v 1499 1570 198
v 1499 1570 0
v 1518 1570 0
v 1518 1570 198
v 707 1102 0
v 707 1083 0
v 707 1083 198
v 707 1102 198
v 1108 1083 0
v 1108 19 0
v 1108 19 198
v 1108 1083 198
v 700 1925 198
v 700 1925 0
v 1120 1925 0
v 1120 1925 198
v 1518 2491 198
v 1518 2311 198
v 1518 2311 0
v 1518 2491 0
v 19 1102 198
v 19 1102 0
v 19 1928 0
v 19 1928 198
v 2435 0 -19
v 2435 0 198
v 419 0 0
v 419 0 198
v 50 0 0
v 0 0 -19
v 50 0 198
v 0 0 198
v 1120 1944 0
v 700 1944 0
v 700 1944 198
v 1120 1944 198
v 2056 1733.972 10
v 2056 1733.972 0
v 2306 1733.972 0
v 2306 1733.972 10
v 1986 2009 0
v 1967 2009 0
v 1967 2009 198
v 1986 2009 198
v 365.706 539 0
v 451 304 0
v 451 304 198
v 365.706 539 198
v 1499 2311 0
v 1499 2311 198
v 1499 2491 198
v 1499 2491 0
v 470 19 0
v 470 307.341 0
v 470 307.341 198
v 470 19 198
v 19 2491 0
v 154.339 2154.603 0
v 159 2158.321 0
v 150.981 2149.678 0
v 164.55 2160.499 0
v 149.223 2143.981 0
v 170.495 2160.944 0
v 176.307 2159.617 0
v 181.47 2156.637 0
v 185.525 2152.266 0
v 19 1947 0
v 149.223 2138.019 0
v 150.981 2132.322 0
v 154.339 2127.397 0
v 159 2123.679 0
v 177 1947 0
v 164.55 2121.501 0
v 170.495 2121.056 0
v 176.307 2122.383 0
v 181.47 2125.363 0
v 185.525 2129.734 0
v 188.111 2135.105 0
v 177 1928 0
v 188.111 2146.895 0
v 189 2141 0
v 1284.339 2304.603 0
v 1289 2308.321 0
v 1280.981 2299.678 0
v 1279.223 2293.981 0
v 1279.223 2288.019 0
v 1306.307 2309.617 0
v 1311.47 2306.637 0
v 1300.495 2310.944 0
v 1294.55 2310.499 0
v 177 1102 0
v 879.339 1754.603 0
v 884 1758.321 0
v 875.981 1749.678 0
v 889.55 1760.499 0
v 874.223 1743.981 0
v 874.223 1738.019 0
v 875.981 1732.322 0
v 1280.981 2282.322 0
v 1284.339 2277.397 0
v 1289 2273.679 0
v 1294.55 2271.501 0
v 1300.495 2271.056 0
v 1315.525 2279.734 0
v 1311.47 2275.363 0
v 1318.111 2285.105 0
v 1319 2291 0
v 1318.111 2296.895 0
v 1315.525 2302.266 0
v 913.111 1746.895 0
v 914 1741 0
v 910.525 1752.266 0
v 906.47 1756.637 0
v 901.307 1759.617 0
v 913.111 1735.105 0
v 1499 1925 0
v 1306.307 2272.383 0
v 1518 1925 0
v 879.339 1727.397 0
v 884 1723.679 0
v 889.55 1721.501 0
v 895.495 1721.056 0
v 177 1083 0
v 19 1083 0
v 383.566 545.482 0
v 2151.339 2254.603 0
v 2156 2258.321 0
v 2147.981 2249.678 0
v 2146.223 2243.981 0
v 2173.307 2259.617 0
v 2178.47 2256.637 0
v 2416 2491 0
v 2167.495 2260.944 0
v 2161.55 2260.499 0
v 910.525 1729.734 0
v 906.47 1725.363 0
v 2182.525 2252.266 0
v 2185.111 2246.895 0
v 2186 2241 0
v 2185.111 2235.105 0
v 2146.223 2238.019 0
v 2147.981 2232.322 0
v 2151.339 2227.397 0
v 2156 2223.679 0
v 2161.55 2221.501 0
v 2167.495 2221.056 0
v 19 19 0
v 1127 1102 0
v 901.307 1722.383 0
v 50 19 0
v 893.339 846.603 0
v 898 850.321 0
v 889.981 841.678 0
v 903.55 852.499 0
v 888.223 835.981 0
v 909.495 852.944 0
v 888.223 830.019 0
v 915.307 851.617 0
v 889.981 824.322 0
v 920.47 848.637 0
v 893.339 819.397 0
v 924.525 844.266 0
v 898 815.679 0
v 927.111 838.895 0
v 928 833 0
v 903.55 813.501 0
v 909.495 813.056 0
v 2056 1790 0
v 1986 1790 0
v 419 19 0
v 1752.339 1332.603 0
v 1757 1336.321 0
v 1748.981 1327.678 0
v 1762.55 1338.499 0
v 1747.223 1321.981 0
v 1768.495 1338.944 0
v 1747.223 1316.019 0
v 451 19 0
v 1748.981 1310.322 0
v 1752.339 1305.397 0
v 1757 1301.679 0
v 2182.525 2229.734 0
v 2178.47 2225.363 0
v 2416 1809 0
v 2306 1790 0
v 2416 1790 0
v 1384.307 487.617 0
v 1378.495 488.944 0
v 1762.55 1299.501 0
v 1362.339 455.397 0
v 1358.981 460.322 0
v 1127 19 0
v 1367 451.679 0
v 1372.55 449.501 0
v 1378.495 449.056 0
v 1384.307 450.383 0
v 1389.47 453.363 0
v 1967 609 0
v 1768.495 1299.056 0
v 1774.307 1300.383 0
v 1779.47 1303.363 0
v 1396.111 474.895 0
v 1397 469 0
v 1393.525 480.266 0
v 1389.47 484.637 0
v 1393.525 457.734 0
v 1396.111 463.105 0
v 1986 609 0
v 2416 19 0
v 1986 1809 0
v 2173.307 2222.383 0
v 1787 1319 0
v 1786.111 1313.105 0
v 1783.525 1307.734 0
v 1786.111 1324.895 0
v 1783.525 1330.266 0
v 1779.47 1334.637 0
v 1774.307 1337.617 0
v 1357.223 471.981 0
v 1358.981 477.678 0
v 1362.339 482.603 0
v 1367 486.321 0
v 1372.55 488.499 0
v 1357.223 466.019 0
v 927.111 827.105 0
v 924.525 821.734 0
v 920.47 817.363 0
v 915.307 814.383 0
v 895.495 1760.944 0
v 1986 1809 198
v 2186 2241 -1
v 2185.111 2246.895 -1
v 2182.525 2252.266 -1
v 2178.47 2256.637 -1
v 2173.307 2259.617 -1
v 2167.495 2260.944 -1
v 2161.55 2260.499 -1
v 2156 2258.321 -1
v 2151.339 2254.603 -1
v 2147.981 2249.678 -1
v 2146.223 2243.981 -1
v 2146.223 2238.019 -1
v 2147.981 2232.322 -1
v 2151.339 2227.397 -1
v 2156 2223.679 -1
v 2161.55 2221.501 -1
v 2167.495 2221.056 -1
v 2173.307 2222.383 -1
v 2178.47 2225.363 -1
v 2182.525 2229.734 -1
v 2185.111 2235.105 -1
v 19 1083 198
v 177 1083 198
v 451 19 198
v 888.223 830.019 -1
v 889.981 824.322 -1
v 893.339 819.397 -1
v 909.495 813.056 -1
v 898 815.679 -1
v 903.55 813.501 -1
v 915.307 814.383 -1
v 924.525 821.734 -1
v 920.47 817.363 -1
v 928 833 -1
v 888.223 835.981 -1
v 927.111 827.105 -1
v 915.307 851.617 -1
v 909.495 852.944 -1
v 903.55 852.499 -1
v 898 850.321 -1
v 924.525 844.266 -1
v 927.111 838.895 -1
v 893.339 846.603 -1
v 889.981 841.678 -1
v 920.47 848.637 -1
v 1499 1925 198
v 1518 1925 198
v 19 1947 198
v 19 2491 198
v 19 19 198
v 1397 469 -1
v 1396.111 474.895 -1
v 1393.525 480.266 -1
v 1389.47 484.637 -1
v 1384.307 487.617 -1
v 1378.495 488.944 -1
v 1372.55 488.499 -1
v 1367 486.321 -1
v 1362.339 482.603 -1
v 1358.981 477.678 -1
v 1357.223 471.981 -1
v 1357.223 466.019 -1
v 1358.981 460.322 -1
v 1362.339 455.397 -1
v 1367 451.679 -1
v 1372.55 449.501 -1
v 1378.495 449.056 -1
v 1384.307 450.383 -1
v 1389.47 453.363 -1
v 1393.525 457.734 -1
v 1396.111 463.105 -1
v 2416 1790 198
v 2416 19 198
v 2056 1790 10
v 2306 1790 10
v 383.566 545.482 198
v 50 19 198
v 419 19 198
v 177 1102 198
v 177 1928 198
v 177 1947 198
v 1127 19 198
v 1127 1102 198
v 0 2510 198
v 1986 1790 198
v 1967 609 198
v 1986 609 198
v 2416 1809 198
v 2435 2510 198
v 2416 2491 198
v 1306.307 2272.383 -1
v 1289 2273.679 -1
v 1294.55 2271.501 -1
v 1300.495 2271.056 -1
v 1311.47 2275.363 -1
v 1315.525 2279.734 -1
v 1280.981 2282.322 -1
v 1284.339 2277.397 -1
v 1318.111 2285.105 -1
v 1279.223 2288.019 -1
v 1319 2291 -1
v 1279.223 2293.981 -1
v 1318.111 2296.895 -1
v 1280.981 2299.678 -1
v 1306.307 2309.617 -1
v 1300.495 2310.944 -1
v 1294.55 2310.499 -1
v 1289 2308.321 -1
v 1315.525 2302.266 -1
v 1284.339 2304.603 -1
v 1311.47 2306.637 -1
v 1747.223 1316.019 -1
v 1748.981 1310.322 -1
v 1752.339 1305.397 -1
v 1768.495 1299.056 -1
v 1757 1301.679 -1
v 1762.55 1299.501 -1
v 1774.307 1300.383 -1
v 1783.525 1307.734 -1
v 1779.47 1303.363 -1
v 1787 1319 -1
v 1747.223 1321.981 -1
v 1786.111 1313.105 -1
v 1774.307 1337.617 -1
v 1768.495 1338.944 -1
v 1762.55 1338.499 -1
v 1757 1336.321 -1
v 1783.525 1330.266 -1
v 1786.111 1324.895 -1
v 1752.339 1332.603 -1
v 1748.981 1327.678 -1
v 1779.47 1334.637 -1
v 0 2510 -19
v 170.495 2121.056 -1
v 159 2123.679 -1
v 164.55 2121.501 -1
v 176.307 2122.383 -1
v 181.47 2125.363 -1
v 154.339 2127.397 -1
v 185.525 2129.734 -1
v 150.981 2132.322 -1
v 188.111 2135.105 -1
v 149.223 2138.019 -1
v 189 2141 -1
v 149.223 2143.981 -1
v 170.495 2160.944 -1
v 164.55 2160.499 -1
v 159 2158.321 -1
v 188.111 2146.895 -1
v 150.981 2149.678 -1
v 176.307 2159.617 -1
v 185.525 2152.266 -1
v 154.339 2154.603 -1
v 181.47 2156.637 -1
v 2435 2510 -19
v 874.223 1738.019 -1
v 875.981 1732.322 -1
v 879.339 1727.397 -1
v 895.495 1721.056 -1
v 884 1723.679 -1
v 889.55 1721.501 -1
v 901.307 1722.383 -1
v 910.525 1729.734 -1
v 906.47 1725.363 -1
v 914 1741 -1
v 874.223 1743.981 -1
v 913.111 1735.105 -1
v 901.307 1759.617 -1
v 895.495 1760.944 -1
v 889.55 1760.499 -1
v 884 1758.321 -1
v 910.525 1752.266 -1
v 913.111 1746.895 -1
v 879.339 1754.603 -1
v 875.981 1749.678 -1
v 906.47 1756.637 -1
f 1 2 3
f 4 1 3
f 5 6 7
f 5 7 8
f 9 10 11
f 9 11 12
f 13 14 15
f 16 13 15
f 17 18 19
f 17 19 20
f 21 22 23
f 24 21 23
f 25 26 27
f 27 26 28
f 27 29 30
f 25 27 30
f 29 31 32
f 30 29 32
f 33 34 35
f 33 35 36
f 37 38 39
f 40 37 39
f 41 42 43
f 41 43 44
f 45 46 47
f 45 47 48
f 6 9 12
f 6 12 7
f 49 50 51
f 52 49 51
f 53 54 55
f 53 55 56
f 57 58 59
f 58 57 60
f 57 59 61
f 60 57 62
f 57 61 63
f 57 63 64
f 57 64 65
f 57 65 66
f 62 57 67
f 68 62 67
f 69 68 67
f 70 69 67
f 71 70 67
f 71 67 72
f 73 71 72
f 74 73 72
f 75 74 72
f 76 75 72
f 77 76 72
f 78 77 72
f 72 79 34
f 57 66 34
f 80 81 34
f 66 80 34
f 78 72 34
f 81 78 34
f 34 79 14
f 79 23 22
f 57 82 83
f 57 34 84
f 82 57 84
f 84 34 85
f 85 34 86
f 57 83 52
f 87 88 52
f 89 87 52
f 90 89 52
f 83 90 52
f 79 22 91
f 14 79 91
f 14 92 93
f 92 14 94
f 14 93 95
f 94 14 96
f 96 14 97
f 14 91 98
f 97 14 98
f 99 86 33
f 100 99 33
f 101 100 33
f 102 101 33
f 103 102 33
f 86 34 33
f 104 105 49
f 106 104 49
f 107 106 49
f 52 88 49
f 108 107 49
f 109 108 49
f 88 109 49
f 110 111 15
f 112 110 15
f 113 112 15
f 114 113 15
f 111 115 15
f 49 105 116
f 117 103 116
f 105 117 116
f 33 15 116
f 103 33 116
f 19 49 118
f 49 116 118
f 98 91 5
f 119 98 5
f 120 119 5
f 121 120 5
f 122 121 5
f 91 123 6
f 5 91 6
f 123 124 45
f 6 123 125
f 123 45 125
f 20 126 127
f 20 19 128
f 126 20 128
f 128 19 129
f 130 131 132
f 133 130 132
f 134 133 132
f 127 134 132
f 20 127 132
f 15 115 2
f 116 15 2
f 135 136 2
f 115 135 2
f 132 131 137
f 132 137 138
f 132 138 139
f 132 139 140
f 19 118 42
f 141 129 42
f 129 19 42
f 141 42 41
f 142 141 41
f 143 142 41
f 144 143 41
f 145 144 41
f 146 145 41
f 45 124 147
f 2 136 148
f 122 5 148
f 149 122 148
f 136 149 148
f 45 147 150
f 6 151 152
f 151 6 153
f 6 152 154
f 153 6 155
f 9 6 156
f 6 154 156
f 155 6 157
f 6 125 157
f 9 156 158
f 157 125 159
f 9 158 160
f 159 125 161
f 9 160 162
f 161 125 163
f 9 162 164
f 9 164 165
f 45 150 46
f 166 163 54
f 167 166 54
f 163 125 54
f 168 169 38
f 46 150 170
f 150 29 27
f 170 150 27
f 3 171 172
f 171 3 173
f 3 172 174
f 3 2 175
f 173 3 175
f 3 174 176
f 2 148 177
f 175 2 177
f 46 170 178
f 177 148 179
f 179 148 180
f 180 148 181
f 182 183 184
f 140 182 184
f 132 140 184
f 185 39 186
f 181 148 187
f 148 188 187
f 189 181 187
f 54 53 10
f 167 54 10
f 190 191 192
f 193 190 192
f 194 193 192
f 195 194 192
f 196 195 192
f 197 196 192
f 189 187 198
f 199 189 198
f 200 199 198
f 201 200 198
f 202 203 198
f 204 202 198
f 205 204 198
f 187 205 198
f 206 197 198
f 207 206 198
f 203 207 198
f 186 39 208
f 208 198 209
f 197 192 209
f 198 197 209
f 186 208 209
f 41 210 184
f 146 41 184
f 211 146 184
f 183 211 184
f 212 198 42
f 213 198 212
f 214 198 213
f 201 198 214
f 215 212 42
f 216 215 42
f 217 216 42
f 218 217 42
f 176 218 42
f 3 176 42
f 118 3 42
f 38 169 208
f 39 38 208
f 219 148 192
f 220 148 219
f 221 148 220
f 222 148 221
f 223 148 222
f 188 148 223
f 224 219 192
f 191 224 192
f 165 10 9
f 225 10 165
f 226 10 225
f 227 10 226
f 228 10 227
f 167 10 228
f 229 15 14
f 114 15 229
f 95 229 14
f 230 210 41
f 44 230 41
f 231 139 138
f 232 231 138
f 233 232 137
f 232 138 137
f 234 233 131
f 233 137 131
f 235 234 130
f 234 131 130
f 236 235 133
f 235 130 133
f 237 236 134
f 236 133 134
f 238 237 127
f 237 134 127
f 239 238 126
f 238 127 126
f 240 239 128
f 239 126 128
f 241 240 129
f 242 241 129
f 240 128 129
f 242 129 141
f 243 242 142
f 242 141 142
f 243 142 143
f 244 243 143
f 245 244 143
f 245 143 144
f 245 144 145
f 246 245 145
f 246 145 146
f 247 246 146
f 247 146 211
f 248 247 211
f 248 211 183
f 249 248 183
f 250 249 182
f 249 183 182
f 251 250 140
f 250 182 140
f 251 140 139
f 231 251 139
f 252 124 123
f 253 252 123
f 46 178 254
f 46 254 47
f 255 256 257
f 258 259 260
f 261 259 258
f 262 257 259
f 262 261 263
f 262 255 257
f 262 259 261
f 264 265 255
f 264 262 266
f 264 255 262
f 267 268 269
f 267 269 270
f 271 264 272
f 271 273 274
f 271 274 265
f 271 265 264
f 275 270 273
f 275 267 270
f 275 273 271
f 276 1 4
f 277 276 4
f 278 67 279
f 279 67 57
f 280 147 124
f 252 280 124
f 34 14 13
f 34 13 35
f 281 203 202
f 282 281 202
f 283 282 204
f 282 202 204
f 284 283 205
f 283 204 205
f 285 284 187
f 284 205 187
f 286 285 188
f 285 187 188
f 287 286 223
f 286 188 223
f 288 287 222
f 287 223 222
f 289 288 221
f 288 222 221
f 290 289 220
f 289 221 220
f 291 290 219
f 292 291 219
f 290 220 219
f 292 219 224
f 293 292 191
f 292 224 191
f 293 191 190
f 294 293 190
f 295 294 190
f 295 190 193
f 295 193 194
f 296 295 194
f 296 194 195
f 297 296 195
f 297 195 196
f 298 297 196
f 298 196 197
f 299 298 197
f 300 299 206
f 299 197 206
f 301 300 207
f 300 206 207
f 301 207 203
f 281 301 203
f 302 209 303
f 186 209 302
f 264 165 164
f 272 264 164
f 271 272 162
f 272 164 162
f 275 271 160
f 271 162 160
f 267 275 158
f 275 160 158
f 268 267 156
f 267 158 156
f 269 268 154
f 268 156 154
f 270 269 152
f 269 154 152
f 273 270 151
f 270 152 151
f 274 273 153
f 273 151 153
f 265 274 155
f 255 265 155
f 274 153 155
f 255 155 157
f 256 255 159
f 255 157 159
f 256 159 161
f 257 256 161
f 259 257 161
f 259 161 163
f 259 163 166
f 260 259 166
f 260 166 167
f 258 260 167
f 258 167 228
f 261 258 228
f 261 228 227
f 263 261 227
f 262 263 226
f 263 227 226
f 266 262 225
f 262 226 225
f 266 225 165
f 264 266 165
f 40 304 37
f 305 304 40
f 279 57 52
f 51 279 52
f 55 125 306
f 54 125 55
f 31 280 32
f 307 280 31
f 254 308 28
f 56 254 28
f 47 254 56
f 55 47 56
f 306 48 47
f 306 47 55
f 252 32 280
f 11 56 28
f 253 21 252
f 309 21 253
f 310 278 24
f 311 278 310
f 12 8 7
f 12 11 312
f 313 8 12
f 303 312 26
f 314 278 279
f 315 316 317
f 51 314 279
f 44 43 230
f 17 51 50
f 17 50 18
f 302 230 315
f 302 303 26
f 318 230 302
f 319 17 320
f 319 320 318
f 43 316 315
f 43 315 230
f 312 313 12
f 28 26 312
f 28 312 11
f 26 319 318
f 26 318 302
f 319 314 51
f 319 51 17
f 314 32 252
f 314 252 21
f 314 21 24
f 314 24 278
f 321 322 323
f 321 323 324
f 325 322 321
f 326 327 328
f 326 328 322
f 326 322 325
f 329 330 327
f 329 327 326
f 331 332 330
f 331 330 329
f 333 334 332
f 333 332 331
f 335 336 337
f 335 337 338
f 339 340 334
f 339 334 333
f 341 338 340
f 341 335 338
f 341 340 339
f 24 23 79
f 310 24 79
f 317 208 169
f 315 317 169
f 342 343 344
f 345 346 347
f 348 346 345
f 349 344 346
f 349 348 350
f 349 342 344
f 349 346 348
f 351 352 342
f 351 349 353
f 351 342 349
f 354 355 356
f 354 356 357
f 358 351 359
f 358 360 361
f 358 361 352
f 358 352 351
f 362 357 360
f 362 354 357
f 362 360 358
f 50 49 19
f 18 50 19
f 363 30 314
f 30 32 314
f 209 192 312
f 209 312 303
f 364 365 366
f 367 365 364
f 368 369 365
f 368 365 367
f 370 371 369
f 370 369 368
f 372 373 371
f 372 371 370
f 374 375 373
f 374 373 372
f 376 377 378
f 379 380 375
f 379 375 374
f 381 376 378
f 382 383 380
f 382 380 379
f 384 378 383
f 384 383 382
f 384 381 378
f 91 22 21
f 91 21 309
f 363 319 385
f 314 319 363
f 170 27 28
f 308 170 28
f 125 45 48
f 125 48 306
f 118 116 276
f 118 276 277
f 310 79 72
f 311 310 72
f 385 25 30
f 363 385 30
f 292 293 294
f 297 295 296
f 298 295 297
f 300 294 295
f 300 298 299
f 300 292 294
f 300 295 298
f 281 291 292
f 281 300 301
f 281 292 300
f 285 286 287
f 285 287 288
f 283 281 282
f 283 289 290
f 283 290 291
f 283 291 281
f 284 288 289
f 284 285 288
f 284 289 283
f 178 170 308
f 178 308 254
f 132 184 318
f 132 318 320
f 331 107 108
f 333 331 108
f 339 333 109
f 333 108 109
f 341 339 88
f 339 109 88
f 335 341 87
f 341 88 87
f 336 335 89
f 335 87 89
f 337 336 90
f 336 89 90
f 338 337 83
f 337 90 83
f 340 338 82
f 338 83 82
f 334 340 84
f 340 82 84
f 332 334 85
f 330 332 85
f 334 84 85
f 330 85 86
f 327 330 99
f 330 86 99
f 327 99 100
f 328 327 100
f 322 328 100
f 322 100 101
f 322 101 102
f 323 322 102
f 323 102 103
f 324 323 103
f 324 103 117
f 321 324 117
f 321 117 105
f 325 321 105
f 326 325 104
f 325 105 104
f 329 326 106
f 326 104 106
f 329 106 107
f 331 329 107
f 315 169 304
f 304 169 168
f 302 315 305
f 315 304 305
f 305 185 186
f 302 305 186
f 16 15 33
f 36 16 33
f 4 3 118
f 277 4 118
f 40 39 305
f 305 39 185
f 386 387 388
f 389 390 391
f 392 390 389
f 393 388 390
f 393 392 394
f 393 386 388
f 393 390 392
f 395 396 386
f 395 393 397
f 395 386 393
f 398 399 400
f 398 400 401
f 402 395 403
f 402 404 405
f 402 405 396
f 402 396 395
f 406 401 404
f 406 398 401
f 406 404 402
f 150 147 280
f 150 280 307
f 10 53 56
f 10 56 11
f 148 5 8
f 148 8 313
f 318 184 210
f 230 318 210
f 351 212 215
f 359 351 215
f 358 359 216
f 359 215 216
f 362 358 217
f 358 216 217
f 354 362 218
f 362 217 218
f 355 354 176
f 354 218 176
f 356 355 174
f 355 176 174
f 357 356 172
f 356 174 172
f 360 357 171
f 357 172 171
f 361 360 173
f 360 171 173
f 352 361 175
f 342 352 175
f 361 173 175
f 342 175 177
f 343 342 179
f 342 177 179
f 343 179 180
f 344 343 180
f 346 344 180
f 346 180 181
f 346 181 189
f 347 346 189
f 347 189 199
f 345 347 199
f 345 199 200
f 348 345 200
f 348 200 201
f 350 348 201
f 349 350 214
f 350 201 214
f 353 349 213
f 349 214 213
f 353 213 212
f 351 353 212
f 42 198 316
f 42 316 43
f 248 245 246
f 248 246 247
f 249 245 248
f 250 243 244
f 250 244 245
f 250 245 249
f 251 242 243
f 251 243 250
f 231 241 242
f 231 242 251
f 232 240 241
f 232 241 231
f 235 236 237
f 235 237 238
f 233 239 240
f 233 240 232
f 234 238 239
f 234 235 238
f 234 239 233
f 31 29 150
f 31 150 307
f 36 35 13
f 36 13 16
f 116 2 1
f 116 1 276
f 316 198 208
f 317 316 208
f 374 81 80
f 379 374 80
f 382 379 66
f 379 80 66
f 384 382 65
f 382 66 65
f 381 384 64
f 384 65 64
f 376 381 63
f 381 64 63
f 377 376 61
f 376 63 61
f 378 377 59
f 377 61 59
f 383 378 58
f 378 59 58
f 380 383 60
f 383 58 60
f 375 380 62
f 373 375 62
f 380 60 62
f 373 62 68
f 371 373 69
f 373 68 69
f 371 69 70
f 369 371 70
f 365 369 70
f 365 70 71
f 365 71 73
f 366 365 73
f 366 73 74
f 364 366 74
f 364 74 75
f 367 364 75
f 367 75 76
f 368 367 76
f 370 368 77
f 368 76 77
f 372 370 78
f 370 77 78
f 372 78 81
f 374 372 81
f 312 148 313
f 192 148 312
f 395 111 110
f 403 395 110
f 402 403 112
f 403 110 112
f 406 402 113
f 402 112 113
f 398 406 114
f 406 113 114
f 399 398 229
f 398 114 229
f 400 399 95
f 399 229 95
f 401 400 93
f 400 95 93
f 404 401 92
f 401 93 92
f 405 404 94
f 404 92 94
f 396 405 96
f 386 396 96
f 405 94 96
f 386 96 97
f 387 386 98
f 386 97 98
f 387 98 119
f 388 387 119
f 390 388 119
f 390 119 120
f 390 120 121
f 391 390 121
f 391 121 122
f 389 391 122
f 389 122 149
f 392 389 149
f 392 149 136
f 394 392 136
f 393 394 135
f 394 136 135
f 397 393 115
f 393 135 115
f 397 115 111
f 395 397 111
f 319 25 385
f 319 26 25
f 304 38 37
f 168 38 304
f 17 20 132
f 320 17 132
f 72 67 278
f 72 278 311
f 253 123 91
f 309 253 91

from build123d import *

# Parameters (mm, degrees)
ESQUISSE1_W             = 2435
ESQUISSE1_H             = 2510
ESQUISSE1_W_2           = 2397
ESQUISSE1_H_2           = 2472
EXTRU_MINCE1_DEPTH      = 198
ESQUISSE2_W             = 2435
ESQUISSE2_H             = 2510
BOSS_EXTRU_1_DEPTH      = 19
EXTRU_MINCE3_DEPTH      = 198
EXTRU_MINCE4_DEPTH      = 198
ESQUISSE6_W             = 158
ESQUISSE6_H             = 19
EXTRU_MINCE5_DEPTH      = 198
ESQUISSE7_W             = 158
ESQUISSE7_H             = 19
EXTRU_MINCE6_DEPTH      = 198
ESQUISSE8_W             = 369
ESQUISSE8_H             = 198
ENL_V_MAT_EXTRU_1_DEPTH = 19
ESQUISSE9_W             = 19
ESQUISSE9_H             = 180
EXTRU_MINCE7_DEPTH      = 198
ESQUISSE10_W            = 420
ESQUISSE10_H            = 19
EXTRU_MINCE8_DEPTH      = 198
ESQUISSE11_W            = 19
ESQUISSE11_H            = 355
EXTRU_MINCE9_DEPTH      = 198
EXTRU_MINCE10_DEPTH     = 198
ESQUISSE14_W            = 19
ESQUISSE14_H            = 200
EXTRU_MINCE11_DEPTH     = 198
ESQUISSE17_W            = 250
ESQUISSE17_H            = 56.028388795
BOSS_EXTRU_2_DEPTH      = 10
ESQUISSE18_R            = 20
ENL_V_MAT_EXTRU_2_DEPTH = 1


with BuildPart() as part:
    # Esquisse1 → Extru.-Mince1 (new body)
    with BuildSketch(Plane.XY):
        with Locations((1217.5, 1255)):
            Rectangle(ESQUISSE1_W, ESQUISSE1_H)
        with Locations((1217.5, 1255)):
            Rectangle(ESQUISSE1_W_2, ESQUISSE1_H_2, mode=Mode.SUBTRACT)
    extrude(amount=EXTRU_MINCE1_DEPTH)

    # Esquisse2 → Boss.-Extru.1 (add)
    with BuildSketch(Plane(origin=(0, 0, 0), x_dir=(-1, 0, 0), z_dir=(0, 0, -1))):
        with Locations((-1217.5, 1255)):
            Rectangle(ESQUISSE2_W, ESQUISSE2_H)
    extrude(amount=BOSS_EXTRU_1_DEPTH)

    # Esquisse4 → Extru.-Mince3 (add)
    with BuildSketch(Plane.XY):
        Polygon((451, 19), (451, 304), (365.706389454, 539), (383.566389454, 545.482314402), (470, 307.341399176), (470, 19), align=None)
    extrude(amount=EXTRU_MINCE3_DEPTH)

    # Esquisse5 → Extru.-Mince4 (add)
    with BuildSketch(Plane.XY):
        Polygon((707, 1102), (1127, 1102), (1127, 19), (1108, 19), (1108, 1083), (707, 1083), align=None)
    extrude(amount=EXTRU_MINCE4_DEPTH)

    # Esquisse6 → Extru.-Mince5 (add)
    with BuildSketch(Plane.XY):
        with Locations((98, 1937.5)):
            Rectangle(ESQUISSE6_W, ESQUISSE6_H)
    extrude(amount=EXTRU_MINCE5_DEPTH)

    # Esquisse7 → Extru.-Mince6 (add)
    with BuildSketch(Plane.XY):
        with Locations((98, 1092.5)):
            Rectangle(ESQUISSE7_W, ESQUISSE7_H)
    extrude(amount=EXTRU_MINCE6_DEPTH)

    # Esquisse8 → Enlèv. mat.-Extru.1 (cut)
    with BuildSketch(Plane.XZ):
        with Locations((234.5, 99)):
            Rectangle(ESQUISSE8_W, ESQUISSE8_H)
    extrude(amount=-ENL_V_MAT_EXTRU_1_DEPTH, mode=Mode.SUBTRACT)

    # Esquisse9 → Extru.-Mince7 (add)
    with BuildSketch(Plane.XY):
        with Locations((1508.5, 2401)):
            Rectangle(ESQUISSE9_W, ESQUISSE9_H)
    extrude(amount=EXTRU_MINCE7_DEPTH)

    # Esquisse10 → Extru.-Mince8 (add)
    with BuildSketch(Plane.XY):
        with Locations((910, 1934.5)):
            Rectangle(ESQUISSE10_W, ESQUISSE10_H)
    extrude(amount=EXTRU_MINCE8_DEPTH)

    # Esquisse11 → Extru.-Mince9 (add)
    with BuildSketch(Plane.XY):
        with Locations((1508.5, 1747.5)):
            Rectangle(ESQUISSE11_W, ESQUISSE11_H)
    extrude(amount=EXTRU_MINCE9_DEPTH)

    # Esquisse13 → Extru.-Mince10 (add)
    with BuildSketch(Plane.XY):
        Polygon((2416, 1809), (1967, 1809), (1967, 609), (1986, 609), (1986, 1790), (2416, 1790), align=None)
    extrude(amount=EXTRU_MINCE10_DEPTH)

    # Esquisse14 → Extru.-Mince11 (add)
    with BuildSketch(Plane.XY):
        with Locations((1976.5, 1909)):
            Rectangle(ESQUISSE14_W, ESQUISSE14_H)
    extrude(amount=EXTRU_MINCE11_DEPTH)

    # Esquisse17 → Boss.-Extru.2 (add)
    with BuildSketch(Plane.XY):
        with Locations((2181, 1761.985805603)):
            Rectangle(ESQUISSE17_W, ESQUISSE17_H)
    extrude(amount=BOSS_EXTRU_2_DEPTH)

    # Esquisse18 → Enlèv. mat.-Extru.2 (cut)
    with BuildSketch(Plane.XY):
        with Locations((2166, 2241)):
            Circle(ESQUISSE18_R)
        with Locations((169, 2141)):
            Circle(ESQUISSE18_R)
        with Locations((1377, 469)):
            Circle(ESQUISSE18_R)
        with Locations((1767, 1319)):
            Circle(ESQUISSE18_R)
        with Locations((894, 1741)):
            Circle(ESQUISSE18_R)
        with Locations((908, 833)):
            Circle(ESQUISSE18_R)
        with Locations((1299, 2291)):
            Circle(ESQUISSE18_R)
    extrude(amount=-ENL_V_MAT_EXTRU_2_DEPTH, mode=Mode.SUBTRACT)


solid = part.part
